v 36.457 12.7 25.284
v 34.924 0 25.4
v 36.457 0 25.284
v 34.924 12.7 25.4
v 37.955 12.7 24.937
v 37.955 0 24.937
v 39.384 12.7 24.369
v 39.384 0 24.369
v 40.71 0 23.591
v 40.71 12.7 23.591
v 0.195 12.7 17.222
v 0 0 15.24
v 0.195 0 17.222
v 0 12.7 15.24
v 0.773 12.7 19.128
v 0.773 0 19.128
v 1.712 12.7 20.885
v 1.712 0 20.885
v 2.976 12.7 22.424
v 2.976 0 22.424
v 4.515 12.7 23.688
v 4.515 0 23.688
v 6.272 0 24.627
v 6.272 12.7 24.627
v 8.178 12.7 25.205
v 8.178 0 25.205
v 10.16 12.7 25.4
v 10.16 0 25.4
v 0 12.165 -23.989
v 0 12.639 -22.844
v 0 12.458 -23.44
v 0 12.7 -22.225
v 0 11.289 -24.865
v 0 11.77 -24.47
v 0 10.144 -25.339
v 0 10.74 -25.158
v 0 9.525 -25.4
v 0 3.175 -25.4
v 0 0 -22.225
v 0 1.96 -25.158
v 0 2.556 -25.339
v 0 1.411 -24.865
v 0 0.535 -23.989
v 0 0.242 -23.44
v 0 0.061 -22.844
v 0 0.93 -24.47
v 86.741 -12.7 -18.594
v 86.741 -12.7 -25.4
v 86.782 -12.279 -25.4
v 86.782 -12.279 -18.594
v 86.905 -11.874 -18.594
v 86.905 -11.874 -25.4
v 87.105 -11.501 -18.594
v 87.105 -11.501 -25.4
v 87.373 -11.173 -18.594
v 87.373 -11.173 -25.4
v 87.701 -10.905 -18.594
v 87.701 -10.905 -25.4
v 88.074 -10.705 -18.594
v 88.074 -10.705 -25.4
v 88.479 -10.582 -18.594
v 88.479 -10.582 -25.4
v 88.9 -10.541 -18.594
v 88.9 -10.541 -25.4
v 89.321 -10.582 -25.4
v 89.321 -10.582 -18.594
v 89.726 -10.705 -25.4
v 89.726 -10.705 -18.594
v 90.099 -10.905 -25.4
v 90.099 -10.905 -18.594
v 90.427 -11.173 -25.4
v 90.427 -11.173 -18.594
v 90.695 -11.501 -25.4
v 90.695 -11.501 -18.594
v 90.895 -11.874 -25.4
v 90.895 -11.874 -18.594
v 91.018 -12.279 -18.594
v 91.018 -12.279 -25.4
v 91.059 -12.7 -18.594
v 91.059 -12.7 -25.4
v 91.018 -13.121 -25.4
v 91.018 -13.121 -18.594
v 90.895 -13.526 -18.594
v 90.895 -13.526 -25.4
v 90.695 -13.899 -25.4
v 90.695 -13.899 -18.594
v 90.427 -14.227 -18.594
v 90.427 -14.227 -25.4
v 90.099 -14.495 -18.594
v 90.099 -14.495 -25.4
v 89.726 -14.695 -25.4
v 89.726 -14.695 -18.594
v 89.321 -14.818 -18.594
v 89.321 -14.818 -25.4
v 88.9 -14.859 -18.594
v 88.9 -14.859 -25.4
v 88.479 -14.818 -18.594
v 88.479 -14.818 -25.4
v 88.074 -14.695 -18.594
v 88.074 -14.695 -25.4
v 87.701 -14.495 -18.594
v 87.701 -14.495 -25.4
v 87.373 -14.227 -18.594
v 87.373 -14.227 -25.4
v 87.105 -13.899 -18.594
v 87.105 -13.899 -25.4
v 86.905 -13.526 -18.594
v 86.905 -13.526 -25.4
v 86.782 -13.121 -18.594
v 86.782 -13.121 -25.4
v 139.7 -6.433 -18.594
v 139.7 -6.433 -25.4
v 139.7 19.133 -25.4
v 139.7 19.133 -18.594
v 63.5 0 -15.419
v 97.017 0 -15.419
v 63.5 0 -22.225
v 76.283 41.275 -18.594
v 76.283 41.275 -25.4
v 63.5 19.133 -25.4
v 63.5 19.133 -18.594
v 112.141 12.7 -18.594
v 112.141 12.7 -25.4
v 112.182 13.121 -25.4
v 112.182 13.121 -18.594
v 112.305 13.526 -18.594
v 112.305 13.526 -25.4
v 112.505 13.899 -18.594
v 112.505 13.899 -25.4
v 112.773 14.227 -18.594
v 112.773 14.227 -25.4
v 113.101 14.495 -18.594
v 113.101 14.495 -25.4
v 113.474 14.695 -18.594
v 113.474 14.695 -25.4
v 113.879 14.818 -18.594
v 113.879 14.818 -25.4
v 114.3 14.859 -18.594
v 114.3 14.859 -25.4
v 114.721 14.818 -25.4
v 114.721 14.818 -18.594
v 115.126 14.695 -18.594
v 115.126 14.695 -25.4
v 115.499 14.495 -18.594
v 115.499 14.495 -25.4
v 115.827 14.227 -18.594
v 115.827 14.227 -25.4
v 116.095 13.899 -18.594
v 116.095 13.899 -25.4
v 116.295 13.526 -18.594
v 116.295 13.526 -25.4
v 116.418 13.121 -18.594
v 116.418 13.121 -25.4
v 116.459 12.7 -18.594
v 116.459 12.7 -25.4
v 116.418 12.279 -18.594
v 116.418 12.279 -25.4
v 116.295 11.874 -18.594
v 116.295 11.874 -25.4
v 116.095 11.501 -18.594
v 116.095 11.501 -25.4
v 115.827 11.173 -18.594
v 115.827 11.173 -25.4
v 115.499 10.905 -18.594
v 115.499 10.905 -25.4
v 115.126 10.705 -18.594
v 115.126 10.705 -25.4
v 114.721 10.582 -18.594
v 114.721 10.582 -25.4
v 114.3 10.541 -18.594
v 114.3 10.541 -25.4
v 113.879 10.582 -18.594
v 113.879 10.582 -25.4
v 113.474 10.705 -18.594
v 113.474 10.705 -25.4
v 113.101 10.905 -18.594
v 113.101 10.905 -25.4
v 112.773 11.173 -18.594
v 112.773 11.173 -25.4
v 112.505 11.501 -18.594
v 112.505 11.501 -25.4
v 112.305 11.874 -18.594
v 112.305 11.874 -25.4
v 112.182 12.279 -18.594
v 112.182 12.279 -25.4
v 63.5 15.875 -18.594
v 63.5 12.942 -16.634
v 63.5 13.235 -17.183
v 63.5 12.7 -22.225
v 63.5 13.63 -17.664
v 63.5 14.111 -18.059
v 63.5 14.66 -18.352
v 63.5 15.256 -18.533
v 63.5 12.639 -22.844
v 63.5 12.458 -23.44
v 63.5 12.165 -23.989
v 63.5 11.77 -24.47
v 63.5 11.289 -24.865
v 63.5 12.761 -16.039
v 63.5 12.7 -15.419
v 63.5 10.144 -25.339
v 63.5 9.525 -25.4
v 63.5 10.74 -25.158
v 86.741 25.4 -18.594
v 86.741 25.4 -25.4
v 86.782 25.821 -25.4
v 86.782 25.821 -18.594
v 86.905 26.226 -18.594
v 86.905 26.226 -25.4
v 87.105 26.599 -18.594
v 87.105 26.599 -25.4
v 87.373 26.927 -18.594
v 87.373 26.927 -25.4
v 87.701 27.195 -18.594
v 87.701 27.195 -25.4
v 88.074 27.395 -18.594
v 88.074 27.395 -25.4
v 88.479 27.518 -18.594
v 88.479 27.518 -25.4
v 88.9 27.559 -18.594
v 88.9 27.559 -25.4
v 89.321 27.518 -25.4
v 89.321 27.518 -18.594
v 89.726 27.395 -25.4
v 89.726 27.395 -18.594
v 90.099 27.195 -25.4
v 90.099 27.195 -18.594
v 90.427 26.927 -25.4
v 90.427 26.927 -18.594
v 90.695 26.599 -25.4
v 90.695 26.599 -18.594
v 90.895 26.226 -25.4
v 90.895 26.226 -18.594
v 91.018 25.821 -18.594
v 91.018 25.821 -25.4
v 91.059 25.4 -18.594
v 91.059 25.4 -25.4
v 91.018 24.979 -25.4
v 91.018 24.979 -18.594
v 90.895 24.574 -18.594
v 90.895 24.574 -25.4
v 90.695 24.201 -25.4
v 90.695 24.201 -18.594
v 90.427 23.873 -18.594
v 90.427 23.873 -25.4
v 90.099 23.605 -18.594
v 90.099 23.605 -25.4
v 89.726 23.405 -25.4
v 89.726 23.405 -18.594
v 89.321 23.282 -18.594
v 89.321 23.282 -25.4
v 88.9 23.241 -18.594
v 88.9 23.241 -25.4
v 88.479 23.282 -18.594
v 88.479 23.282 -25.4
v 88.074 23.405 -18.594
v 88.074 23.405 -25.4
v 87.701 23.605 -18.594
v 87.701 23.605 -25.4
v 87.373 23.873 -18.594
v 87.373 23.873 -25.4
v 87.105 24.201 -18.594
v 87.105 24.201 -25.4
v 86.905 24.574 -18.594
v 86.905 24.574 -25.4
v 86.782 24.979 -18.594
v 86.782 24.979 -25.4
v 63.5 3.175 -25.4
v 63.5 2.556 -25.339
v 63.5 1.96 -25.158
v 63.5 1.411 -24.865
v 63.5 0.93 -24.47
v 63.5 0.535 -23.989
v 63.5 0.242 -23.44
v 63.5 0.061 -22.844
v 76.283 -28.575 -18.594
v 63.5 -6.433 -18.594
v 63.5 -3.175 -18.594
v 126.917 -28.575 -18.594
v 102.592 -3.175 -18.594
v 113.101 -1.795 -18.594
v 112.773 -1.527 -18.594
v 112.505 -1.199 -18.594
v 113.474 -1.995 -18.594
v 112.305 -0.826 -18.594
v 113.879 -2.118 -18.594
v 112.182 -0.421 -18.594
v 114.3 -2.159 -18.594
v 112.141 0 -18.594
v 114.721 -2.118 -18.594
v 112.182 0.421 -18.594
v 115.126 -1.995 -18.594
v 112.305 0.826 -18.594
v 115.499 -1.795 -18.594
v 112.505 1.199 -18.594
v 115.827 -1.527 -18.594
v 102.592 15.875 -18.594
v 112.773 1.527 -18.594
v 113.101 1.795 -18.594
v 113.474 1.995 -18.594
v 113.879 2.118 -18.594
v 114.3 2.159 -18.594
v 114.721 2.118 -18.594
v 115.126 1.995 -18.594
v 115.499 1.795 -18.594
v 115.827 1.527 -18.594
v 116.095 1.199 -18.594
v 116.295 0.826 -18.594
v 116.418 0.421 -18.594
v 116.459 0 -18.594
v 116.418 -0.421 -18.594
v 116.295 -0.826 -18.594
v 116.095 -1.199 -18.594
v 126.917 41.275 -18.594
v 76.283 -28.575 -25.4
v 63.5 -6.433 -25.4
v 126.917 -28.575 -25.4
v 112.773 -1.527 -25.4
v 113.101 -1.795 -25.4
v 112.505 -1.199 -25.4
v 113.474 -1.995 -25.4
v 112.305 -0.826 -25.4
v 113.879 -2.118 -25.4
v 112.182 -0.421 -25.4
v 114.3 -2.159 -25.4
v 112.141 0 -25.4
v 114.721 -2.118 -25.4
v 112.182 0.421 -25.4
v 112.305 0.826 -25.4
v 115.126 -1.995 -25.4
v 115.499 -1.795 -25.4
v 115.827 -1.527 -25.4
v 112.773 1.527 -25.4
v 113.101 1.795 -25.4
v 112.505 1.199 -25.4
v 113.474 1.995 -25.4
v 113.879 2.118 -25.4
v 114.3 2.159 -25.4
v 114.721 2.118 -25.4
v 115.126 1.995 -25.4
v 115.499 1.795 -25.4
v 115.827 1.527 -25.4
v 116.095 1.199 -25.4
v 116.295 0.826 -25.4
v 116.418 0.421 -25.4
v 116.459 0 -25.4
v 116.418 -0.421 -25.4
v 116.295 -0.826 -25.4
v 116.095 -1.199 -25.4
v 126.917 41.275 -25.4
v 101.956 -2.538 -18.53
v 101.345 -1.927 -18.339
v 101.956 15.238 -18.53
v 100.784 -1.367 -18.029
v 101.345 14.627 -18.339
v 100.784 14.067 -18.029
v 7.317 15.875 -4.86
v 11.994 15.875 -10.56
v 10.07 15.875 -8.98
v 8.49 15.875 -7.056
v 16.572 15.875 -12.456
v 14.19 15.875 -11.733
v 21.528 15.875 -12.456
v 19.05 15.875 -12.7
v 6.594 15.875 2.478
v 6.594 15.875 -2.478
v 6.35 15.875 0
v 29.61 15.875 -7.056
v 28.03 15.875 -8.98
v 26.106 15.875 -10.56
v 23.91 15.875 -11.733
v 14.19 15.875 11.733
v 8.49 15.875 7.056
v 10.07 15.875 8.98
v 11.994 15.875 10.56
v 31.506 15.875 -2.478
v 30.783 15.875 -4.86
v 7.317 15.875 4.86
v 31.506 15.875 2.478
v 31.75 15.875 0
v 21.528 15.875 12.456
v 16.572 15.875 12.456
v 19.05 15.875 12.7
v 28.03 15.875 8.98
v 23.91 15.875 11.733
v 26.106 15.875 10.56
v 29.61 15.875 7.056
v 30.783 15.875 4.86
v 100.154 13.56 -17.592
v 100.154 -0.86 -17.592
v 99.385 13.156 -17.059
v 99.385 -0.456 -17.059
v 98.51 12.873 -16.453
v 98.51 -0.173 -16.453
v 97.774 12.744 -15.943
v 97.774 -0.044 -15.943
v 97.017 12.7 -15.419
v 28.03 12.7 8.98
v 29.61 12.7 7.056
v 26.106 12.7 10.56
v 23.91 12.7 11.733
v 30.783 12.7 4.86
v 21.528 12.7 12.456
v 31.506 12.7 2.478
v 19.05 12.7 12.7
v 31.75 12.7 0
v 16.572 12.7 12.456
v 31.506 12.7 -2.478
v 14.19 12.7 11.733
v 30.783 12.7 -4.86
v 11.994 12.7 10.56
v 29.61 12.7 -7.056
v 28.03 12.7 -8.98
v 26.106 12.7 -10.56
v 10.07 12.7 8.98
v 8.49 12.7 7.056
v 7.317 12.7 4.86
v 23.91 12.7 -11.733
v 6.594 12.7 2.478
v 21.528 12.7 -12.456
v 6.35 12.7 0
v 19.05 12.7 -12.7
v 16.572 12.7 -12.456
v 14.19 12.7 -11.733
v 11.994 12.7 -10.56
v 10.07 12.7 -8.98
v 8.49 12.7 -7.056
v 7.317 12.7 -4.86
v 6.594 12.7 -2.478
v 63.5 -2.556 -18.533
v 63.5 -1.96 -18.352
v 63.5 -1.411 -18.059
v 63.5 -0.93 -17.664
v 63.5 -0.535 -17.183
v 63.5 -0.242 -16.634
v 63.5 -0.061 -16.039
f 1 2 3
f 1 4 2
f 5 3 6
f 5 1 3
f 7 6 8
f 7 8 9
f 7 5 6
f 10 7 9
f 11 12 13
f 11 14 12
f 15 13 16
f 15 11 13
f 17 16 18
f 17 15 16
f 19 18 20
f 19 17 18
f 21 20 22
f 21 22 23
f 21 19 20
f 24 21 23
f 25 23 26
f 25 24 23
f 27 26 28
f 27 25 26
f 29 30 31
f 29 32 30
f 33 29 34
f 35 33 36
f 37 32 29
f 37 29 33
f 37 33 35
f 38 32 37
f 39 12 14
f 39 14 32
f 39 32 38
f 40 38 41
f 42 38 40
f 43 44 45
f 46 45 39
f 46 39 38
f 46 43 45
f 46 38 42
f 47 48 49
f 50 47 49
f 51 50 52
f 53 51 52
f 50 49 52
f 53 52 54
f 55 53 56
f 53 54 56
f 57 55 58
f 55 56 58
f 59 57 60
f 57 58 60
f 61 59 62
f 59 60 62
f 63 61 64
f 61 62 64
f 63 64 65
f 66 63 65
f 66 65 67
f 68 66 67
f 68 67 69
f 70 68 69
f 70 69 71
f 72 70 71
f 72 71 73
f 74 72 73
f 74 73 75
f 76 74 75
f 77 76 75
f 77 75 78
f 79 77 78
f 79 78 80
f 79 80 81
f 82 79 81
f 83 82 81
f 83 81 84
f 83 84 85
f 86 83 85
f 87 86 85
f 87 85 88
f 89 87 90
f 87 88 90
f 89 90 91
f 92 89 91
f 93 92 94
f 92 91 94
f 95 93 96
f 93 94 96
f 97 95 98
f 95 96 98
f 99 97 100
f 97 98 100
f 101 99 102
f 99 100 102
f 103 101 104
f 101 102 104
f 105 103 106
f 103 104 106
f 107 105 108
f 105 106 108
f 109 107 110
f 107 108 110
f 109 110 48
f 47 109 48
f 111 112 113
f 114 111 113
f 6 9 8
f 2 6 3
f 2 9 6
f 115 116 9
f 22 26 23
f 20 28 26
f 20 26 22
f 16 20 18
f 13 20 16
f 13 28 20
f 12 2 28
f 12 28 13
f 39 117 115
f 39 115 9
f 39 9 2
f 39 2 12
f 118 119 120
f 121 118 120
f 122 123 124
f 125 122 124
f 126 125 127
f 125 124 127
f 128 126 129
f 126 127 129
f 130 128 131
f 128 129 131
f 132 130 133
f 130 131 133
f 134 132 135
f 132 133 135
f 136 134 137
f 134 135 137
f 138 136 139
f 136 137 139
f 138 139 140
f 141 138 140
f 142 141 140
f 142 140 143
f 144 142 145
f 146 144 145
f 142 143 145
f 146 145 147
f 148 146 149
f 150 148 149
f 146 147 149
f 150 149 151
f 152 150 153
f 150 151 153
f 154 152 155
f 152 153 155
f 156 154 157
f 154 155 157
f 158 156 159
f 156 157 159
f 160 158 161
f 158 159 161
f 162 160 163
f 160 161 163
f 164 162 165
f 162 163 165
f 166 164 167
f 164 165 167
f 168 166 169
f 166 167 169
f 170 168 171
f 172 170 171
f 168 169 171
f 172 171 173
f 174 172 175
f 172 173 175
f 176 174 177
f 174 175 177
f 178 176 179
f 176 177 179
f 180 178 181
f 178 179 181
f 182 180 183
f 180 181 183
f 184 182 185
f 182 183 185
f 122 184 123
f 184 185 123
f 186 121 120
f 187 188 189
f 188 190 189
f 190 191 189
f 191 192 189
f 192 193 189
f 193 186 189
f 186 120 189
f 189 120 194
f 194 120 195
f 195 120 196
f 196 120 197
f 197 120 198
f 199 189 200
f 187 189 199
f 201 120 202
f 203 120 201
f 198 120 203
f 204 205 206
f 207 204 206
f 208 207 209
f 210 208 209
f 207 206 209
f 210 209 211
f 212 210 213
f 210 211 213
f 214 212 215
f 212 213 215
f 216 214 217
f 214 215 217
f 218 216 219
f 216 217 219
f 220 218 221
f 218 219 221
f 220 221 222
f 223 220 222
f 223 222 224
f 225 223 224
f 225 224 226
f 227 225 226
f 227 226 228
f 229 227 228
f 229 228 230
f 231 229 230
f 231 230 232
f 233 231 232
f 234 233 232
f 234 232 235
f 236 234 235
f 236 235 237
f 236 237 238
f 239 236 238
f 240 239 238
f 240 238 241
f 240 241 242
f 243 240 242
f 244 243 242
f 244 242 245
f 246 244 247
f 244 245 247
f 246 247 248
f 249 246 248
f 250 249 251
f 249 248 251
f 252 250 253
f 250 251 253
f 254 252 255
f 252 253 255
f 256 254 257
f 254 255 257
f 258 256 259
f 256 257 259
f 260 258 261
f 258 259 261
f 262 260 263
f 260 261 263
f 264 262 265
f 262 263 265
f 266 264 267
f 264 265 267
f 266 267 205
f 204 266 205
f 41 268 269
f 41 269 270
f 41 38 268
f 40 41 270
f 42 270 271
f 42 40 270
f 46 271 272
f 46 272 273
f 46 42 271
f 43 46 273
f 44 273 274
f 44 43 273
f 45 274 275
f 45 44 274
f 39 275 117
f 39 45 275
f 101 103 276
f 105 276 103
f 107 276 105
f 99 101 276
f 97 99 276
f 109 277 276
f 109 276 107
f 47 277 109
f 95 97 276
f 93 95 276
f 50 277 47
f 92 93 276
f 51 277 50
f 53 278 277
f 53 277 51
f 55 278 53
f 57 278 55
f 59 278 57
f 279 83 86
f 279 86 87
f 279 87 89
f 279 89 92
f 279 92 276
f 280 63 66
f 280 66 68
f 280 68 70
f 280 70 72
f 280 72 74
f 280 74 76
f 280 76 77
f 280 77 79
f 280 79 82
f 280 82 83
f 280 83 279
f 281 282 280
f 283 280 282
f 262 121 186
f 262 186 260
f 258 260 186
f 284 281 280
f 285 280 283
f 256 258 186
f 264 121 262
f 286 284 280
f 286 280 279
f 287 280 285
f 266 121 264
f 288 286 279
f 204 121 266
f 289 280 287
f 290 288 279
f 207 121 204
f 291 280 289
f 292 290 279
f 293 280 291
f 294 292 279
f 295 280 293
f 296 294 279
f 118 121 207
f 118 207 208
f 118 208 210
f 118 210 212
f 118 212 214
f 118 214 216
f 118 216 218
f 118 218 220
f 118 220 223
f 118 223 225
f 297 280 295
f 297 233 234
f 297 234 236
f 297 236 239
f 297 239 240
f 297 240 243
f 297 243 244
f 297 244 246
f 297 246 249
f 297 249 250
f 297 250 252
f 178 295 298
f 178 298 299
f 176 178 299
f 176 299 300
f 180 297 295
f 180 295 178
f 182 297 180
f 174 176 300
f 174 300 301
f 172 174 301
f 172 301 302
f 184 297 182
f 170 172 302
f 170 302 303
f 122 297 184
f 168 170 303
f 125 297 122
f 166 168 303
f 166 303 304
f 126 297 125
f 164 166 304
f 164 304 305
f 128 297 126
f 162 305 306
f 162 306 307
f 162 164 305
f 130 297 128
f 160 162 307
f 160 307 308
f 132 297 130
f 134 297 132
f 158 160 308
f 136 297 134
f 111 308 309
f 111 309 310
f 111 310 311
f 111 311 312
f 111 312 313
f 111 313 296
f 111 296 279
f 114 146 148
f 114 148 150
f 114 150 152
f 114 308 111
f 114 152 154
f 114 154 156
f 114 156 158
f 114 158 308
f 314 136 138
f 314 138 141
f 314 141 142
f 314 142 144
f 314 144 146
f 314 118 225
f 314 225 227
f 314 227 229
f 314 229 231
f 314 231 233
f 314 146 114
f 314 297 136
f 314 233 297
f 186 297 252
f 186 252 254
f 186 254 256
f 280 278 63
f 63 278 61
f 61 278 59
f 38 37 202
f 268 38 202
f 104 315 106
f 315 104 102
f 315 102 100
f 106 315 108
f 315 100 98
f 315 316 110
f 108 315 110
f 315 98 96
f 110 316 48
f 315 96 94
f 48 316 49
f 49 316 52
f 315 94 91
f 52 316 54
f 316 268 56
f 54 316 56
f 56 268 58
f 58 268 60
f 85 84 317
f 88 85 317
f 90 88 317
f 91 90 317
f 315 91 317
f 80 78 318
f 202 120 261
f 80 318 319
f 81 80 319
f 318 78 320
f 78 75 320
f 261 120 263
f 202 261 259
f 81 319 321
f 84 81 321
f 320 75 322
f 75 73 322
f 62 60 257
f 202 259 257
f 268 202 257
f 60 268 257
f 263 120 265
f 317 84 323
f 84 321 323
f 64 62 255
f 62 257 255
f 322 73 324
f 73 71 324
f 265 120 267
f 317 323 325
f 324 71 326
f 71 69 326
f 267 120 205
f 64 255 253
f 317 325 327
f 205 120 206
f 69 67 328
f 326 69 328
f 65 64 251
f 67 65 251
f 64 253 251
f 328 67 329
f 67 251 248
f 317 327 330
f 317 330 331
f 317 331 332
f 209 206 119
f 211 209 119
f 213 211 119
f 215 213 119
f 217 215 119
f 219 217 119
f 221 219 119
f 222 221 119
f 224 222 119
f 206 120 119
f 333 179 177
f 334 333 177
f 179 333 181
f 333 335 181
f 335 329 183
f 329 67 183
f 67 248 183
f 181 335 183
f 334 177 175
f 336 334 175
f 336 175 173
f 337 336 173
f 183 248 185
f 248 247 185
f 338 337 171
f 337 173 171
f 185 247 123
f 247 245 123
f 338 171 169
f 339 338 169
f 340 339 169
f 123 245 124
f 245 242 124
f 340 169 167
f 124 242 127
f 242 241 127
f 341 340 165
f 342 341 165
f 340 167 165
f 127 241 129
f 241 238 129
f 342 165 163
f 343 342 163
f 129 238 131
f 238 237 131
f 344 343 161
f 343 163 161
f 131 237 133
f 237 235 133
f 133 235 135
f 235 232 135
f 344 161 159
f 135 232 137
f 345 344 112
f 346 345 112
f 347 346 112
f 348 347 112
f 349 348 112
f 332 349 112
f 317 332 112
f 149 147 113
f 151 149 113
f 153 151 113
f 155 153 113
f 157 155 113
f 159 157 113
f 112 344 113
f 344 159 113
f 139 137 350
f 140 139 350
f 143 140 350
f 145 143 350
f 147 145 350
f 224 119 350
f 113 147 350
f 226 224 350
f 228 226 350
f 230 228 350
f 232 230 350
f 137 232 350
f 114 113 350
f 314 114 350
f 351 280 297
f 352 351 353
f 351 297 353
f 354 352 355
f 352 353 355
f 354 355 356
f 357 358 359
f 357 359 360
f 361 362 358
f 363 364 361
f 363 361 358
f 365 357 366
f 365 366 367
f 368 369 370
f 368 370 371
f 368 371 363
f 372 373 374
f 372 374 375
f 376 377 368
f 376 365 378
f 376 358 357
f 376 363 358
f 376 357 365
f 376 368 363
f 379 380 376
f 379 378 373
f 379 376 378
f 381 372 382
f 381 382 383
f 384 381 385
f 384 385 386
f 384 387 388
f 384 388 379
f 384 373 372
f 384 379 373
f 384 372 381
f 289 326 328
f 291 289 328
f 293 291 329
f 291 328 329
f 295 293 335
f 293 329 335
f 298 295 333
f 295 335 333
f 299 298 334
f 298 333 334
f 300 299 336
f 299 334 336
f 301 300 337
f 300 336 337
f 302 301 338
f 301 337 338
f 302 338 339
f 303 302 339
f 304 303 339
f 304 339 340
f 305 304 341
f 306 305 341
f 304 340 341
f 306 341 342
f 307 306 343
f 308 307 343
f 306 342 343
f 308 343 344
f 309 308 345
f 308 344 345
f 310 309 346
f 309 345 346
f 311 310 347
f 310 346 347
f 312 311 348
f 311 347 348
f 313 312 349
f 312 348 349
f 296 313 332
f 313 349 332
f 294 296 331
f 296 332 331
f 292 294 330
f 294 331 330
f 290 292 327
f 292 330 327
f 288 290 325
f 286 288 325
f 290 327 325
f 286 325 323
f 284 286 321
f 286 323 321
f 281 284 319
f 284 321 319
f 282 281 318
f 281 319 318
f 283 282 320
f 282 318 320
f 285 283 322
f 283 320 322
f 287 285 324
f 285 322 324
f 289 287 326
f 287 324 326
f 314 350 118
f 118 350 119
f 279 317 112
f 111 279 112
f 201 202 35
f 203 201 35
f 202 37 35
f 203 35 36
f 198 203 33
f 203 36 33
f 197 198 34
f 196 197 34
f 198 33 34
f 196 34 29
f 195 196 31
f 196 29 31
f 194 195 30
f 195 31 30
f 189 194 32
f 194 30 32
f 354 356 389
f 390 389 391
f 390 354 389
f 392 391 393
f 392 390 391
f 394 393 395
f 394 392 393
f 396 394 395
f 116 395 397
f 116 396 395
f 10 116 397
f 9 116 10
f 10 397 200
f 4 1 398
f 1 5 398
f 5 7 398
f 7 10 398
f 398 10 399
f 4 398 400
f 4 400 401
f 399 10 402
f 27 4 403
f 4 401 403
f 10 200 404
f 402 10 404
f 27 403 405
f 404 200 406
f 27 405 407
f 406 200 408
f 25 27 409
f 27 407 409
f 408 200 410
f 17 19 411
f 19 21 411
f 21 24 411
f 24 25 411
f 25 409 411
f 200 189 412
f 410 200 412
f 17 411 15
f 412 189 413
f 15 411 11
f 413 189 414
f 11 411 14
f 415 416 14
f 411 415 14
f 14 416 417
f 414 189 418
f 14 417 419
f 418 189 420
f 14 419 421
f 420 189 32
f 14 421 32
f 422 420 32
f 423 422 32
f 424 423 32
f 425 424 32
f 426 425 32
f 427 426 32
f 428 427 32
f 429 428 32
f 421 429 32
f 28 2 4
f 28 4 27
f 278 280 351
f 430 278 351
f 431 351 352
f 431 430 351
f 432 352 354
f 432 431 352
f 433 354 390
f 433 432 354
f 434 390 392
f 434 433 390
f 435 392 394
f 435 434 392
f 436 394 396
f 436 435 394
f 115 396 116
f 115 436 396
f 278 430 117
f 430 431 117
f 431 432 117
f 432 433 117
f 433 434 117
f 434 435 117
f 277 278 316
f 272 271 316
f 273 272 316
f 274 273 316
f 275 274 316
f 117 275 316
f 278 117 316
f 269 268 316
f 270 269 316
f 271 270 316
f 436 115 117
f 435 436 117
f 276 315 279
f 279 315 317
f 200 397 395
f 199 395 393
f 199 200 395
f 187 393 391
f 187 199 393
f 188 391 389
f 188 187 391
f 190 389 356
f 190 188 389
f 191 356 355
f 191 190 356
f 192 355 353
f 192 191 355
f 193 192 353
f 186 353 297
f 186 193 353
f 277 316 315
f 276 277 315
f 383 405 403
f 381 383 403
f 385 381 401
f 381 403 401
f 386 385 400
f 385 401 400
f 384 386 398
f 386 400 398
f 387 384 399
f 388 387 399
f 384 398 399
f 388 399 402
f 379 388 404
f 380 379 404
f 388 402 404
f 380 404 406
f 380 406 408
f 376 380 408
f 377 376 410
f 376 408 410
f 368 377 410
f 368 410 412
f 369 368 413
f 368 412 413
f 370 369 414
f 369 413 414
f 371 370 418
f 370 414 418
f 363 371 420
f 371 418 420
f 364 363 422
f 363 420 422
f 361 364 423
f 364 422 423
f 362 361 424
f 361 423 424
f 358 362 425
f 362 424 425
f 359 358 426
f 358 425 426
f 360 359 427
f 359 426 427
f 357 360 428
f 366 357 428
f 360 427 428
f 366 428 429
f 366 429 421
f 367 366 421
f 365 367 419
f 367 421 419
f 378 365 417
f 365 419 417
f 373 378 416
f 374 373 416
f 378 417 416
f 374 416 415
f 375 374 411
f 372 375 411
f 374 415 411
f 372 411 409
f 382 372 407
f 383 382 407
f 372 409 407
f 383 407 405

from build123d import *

# Parameters (mm, degrees)
BOSS_EXTRUDE1_DEPTH = 12.7
BOSS_EXTRUDE2_DEPTH = 6.805909
SKETCH3_R           = 2.159
CUT_EXTRUDE1_DEPTH  = 155.273638788
SKETCH5_R           = 2.159
CUT_EXTRUDE2_DEPTH  = 6.805909488
FILLET1_R           = 3.175
SKETCH6_R           = 12.7
BOSS_EXTRUDE3_DEPTH = 3.175
FILLET2_R           = 10.16


with BuildPart() as part:
    # Sketch1 → Boss-Extrude1 (new body)
    with BuildSketch(Plane(origin=(0, 0, 0), x_dir=(1, 0, 0), z_dir=(0, 1, 0))):
        Polygon((0, 25.4), (38.1, 25.4), (101.6, 25.4), (101.6, 18.594090512), (38.1, -25.4), (0, -25.4), align=None)
    extrude(amount=BOSS_EXTRUDE1_DEPTH)

    # Sketch2 → Boss-Extrude2 (add)
    with BuildSketch(Plane(origin=(0, 0, -25.4), x_dir=(-1, 0, 0), z_dir=(0, 0, -1))):
        Polygon((-63.5, 19.133437227), (-63.5, -6.433437227), (-76.283437227, -28.575), (-126.916562773, -28.575), (-139.7, -6.433437227), (-139.7, 19.133437227), (-126.916562773, 41.275), (-76.283437227, 41.275), align=None)
    extrude(amount=-BOSS_EXTRUDE2_DEPTH)

    # Sketch3 → Cut-Extrude1 (cut, through all)
    with BuildSketch(Plane(origin=(0, 0, -25.4), x_dir=(-1, 0, 0), z_dir=(0, 0, -1))):
        with Locations((-88.9, 25.4)):
            Circle(SKETCH3_R)
        with Locations((-88.9, -12.7)):
            Circle(SKETCH3_R)
    extrude(amount=-CUT_EXTRUDE1_DEPTH, mode=Mode.SUBTRACT)

    # Sketch5 → Cut-Extrude2 (cut)
    with BuildSketch(Plane(origin=(0, 0, -25.4), x_dir=(-1, 0, 0), z_dir=(0, 0, -1))):
        with Locations((-114.3, 0)):
            Circle(SKETCH5_R)
        with Locations((-114.3, 12.7)):
            Circle(SKETCH5_R)
    extrude(amount=-CUT_EXTRUDE2_DEPTH, mode=Mode.SUBTRACT)

    # Fillet1
    fillet1_edges = [part.edges().sort_by_distance(p)[0] for p in [
        (101.6, 6.35, -18.594090512),
        (31.75, 0, -25.4),
        (82.55, 0, -18.594091),
        (31.75, 12.7, -25.4),
        (82.55, 12.7, -18.594091),
    ]]
    fillet(fillet1_edges, radius=FILLET1_R)

    # Sketch6 → Boss-Extrude3 (add)
    with BuildSketch(Plane(origin=(0, 12.7, 0), x_dir=(1, 0, 0), z_dir=(0, 1, 0))):
        with Locations(Location((19.05, 0, 0), (0, 0, 270))):
            Circle(SKETCH6_R)
    extrude(amount=BOSS_EXTRUDE3_DEPTH)

    # Fillet2
    fillet2_edges = [part.edges().sort_by_distance(p)[0] for p in [
        (38.1, 6.35, 25.4),
        (0, 6.35, 25.4),
    ]]
    fillet(fillet2_edges, radius=FILLET2_R)


solid = part.part
